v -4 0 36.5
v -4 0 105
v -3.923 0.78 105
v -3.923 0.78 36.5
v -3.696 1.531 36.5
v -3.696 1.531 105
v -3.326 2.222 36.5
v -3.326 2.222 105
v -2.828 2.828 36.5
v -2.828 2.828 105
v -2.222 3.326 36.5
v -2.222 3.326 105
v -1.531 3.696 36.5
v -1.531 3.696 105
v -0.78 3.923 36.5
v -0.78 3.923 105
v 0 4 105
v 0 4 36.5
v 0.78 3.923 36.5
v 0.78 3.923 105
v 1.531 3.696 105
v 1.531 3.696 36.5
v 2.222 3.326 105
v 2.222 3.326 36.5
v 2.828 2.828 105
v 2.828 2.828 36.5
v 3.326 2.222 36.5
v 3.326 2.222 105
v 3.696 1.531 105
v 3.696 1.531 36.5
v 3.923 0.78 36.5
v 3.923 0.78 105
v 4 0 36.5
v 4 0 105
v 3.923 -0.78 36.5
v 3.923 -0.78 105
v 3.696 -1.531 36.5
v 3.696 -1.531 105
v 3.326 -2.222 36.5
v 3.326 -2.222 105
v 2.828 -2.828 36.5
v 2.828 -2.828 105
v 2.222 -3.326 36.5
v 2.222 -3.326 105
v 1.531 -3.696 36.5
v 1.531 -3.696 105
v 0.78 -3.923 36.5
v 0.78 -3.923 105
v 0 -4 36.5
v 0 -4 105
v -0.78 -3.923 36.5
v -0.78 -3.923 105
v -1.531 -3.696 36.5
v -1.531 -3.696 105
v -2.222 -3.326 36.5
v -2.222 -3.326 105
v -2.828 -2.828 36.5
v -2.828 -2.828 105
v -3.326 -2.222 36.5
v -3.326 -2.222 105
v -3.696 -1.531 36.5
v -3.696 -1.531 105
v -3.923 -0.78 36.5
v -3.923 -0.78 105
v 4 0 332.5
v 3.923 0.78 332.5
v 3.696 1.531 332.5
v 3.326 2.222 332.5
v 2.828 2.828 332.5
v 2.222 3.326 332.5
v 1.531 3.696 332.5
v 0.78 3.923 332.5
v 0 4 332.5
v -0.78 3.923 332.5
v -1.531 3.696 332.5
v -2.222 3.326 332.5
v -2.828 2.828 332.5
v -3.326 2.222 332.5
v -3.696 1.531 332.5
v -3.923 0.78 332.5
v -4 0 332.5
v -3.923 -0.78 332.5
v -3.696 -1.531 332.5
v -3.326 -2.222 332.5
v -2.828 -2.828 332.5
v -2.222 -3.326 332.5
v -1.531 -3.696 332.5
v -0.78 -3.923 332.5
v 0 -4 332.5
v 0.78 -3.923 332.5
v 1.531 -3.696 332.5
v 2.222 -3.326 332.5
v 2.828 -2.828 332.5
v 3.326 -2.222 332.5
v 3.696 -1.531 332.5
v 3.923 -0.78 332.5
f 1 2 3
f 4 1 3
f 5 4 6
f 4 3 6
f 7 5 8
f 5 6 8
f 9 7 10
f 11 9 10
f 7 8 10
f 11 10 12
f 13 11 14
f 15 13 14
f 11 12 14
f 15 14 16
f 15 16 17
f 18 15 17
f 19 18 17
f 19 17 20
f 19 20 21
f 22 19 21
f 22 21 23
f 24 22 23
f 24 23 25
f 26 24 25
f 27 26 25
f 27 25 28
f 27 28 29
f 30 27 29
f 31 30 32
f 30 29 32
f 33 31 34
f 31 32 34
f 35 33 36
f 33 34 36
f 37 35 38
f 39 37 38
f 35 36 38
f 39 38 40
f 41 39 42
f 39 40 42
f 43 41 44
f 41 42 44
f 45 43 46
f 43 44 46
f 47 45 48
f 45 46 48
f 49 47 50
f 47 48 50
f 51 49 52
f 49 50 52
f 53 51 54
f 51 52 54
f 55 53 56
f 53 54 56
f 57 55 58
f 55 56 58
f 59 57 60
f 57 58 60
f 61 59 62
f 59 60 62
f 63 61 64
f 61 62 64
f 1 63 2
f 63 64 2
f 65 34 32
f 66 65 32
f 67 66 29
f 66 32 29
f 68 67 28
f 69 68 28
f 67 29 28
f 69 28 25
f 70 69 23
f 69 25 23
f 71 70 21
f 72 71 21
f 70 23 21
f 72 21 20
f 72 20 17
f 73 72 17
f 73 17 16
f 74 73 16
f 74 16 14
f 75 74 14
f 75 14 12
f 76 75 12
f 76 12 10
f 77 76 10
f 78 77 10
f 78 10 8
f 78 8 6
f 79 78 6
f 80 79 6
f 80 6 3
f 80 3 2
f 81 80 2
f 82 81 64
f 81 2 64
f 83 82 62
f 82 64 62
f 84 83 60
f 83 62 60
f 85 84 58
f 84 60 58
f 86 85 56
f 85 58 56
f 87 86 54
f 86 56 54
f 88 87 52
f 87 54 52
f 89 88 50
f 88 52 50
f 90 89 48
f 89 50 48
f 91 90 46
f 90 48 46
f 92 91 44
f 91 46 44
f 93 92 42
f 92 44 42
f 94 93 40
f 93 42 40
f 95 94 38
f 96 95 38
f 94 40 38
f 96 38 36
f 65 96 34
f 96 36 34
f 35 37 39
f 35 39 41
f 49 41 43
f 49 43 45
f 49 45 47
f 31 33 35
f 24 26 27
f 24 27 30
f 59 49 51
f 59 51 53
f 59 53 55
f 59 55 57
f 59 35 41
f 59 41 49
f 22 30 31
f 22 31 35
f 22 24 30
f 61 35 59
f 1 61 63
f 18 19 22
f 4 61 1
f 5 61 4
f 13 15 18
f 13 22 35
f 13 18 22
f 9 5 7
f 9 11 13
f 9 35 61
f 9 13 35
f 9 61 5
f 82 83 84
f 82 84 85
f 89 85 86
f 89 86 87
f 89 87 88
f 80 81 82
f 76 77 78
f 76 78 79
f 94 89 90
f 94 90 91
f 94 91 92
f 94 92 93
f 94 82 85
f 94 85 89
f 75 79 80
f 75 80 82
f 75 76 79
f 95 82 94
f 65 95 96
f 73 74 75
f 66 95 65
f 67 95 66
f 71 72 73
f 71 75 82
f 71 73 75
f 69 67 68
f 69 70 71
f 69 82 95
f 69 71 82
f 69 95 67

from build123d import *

# Parameters (mm, degrees)
SKETCH1_R           = 4
BOSS_EXTRUDE1_DEPTH = 287.5
SKETCH2_R           = 4
BOSS_EXTRUDE2_DEPTH = 45
SKETCH3_R           = 4
CUT_EXTRUDE1_DEPTH  = 105
SKETCH4_R           = 4
BOSS_EXTRUDE3_DEPTH = 68.5


with BuildPart() as part:
    # Sketch1 → Boss-Extrude1 (new body)
    with BuildSketch(Plane.XY):
        Circle(SKETCH1_R)
    extrude(amount=BOSS_EXTRUDE1_DEPTH)

    # Sketch2 → Boss-Extrude2 (add)
    with BuildSketch(Plane.XY.offset(287.5)):
        Circle(SKETCH2_R)
    extrude(amount=BOSS_EXTRUDE2_DEPTH)

    # Sketch3 → Cut-Extrude1 (cut)
    with BuildSketch(Plane(origin=(0, 0, 0), x_dir=(-1, 0, 0), z_dir=(0, 0, -1))):
        Circle(SKETCH3_R)
    extrude(amount=-CUT_EXTRUDE1_DEPTH, mode=Mode.SUBTRACT)

    # Sketch4 → Boss-Extrude3 (add)
    with BuildSketch(Plane(origin=(0, 0, 105), x_dir=(-1, 0, 0), z_dir=(0, 0, -1))):
        Circle(SKETCH4_R)
    extrude(amount=BOSS_EXTRUDE3_DEPTH)


solid = part.part
